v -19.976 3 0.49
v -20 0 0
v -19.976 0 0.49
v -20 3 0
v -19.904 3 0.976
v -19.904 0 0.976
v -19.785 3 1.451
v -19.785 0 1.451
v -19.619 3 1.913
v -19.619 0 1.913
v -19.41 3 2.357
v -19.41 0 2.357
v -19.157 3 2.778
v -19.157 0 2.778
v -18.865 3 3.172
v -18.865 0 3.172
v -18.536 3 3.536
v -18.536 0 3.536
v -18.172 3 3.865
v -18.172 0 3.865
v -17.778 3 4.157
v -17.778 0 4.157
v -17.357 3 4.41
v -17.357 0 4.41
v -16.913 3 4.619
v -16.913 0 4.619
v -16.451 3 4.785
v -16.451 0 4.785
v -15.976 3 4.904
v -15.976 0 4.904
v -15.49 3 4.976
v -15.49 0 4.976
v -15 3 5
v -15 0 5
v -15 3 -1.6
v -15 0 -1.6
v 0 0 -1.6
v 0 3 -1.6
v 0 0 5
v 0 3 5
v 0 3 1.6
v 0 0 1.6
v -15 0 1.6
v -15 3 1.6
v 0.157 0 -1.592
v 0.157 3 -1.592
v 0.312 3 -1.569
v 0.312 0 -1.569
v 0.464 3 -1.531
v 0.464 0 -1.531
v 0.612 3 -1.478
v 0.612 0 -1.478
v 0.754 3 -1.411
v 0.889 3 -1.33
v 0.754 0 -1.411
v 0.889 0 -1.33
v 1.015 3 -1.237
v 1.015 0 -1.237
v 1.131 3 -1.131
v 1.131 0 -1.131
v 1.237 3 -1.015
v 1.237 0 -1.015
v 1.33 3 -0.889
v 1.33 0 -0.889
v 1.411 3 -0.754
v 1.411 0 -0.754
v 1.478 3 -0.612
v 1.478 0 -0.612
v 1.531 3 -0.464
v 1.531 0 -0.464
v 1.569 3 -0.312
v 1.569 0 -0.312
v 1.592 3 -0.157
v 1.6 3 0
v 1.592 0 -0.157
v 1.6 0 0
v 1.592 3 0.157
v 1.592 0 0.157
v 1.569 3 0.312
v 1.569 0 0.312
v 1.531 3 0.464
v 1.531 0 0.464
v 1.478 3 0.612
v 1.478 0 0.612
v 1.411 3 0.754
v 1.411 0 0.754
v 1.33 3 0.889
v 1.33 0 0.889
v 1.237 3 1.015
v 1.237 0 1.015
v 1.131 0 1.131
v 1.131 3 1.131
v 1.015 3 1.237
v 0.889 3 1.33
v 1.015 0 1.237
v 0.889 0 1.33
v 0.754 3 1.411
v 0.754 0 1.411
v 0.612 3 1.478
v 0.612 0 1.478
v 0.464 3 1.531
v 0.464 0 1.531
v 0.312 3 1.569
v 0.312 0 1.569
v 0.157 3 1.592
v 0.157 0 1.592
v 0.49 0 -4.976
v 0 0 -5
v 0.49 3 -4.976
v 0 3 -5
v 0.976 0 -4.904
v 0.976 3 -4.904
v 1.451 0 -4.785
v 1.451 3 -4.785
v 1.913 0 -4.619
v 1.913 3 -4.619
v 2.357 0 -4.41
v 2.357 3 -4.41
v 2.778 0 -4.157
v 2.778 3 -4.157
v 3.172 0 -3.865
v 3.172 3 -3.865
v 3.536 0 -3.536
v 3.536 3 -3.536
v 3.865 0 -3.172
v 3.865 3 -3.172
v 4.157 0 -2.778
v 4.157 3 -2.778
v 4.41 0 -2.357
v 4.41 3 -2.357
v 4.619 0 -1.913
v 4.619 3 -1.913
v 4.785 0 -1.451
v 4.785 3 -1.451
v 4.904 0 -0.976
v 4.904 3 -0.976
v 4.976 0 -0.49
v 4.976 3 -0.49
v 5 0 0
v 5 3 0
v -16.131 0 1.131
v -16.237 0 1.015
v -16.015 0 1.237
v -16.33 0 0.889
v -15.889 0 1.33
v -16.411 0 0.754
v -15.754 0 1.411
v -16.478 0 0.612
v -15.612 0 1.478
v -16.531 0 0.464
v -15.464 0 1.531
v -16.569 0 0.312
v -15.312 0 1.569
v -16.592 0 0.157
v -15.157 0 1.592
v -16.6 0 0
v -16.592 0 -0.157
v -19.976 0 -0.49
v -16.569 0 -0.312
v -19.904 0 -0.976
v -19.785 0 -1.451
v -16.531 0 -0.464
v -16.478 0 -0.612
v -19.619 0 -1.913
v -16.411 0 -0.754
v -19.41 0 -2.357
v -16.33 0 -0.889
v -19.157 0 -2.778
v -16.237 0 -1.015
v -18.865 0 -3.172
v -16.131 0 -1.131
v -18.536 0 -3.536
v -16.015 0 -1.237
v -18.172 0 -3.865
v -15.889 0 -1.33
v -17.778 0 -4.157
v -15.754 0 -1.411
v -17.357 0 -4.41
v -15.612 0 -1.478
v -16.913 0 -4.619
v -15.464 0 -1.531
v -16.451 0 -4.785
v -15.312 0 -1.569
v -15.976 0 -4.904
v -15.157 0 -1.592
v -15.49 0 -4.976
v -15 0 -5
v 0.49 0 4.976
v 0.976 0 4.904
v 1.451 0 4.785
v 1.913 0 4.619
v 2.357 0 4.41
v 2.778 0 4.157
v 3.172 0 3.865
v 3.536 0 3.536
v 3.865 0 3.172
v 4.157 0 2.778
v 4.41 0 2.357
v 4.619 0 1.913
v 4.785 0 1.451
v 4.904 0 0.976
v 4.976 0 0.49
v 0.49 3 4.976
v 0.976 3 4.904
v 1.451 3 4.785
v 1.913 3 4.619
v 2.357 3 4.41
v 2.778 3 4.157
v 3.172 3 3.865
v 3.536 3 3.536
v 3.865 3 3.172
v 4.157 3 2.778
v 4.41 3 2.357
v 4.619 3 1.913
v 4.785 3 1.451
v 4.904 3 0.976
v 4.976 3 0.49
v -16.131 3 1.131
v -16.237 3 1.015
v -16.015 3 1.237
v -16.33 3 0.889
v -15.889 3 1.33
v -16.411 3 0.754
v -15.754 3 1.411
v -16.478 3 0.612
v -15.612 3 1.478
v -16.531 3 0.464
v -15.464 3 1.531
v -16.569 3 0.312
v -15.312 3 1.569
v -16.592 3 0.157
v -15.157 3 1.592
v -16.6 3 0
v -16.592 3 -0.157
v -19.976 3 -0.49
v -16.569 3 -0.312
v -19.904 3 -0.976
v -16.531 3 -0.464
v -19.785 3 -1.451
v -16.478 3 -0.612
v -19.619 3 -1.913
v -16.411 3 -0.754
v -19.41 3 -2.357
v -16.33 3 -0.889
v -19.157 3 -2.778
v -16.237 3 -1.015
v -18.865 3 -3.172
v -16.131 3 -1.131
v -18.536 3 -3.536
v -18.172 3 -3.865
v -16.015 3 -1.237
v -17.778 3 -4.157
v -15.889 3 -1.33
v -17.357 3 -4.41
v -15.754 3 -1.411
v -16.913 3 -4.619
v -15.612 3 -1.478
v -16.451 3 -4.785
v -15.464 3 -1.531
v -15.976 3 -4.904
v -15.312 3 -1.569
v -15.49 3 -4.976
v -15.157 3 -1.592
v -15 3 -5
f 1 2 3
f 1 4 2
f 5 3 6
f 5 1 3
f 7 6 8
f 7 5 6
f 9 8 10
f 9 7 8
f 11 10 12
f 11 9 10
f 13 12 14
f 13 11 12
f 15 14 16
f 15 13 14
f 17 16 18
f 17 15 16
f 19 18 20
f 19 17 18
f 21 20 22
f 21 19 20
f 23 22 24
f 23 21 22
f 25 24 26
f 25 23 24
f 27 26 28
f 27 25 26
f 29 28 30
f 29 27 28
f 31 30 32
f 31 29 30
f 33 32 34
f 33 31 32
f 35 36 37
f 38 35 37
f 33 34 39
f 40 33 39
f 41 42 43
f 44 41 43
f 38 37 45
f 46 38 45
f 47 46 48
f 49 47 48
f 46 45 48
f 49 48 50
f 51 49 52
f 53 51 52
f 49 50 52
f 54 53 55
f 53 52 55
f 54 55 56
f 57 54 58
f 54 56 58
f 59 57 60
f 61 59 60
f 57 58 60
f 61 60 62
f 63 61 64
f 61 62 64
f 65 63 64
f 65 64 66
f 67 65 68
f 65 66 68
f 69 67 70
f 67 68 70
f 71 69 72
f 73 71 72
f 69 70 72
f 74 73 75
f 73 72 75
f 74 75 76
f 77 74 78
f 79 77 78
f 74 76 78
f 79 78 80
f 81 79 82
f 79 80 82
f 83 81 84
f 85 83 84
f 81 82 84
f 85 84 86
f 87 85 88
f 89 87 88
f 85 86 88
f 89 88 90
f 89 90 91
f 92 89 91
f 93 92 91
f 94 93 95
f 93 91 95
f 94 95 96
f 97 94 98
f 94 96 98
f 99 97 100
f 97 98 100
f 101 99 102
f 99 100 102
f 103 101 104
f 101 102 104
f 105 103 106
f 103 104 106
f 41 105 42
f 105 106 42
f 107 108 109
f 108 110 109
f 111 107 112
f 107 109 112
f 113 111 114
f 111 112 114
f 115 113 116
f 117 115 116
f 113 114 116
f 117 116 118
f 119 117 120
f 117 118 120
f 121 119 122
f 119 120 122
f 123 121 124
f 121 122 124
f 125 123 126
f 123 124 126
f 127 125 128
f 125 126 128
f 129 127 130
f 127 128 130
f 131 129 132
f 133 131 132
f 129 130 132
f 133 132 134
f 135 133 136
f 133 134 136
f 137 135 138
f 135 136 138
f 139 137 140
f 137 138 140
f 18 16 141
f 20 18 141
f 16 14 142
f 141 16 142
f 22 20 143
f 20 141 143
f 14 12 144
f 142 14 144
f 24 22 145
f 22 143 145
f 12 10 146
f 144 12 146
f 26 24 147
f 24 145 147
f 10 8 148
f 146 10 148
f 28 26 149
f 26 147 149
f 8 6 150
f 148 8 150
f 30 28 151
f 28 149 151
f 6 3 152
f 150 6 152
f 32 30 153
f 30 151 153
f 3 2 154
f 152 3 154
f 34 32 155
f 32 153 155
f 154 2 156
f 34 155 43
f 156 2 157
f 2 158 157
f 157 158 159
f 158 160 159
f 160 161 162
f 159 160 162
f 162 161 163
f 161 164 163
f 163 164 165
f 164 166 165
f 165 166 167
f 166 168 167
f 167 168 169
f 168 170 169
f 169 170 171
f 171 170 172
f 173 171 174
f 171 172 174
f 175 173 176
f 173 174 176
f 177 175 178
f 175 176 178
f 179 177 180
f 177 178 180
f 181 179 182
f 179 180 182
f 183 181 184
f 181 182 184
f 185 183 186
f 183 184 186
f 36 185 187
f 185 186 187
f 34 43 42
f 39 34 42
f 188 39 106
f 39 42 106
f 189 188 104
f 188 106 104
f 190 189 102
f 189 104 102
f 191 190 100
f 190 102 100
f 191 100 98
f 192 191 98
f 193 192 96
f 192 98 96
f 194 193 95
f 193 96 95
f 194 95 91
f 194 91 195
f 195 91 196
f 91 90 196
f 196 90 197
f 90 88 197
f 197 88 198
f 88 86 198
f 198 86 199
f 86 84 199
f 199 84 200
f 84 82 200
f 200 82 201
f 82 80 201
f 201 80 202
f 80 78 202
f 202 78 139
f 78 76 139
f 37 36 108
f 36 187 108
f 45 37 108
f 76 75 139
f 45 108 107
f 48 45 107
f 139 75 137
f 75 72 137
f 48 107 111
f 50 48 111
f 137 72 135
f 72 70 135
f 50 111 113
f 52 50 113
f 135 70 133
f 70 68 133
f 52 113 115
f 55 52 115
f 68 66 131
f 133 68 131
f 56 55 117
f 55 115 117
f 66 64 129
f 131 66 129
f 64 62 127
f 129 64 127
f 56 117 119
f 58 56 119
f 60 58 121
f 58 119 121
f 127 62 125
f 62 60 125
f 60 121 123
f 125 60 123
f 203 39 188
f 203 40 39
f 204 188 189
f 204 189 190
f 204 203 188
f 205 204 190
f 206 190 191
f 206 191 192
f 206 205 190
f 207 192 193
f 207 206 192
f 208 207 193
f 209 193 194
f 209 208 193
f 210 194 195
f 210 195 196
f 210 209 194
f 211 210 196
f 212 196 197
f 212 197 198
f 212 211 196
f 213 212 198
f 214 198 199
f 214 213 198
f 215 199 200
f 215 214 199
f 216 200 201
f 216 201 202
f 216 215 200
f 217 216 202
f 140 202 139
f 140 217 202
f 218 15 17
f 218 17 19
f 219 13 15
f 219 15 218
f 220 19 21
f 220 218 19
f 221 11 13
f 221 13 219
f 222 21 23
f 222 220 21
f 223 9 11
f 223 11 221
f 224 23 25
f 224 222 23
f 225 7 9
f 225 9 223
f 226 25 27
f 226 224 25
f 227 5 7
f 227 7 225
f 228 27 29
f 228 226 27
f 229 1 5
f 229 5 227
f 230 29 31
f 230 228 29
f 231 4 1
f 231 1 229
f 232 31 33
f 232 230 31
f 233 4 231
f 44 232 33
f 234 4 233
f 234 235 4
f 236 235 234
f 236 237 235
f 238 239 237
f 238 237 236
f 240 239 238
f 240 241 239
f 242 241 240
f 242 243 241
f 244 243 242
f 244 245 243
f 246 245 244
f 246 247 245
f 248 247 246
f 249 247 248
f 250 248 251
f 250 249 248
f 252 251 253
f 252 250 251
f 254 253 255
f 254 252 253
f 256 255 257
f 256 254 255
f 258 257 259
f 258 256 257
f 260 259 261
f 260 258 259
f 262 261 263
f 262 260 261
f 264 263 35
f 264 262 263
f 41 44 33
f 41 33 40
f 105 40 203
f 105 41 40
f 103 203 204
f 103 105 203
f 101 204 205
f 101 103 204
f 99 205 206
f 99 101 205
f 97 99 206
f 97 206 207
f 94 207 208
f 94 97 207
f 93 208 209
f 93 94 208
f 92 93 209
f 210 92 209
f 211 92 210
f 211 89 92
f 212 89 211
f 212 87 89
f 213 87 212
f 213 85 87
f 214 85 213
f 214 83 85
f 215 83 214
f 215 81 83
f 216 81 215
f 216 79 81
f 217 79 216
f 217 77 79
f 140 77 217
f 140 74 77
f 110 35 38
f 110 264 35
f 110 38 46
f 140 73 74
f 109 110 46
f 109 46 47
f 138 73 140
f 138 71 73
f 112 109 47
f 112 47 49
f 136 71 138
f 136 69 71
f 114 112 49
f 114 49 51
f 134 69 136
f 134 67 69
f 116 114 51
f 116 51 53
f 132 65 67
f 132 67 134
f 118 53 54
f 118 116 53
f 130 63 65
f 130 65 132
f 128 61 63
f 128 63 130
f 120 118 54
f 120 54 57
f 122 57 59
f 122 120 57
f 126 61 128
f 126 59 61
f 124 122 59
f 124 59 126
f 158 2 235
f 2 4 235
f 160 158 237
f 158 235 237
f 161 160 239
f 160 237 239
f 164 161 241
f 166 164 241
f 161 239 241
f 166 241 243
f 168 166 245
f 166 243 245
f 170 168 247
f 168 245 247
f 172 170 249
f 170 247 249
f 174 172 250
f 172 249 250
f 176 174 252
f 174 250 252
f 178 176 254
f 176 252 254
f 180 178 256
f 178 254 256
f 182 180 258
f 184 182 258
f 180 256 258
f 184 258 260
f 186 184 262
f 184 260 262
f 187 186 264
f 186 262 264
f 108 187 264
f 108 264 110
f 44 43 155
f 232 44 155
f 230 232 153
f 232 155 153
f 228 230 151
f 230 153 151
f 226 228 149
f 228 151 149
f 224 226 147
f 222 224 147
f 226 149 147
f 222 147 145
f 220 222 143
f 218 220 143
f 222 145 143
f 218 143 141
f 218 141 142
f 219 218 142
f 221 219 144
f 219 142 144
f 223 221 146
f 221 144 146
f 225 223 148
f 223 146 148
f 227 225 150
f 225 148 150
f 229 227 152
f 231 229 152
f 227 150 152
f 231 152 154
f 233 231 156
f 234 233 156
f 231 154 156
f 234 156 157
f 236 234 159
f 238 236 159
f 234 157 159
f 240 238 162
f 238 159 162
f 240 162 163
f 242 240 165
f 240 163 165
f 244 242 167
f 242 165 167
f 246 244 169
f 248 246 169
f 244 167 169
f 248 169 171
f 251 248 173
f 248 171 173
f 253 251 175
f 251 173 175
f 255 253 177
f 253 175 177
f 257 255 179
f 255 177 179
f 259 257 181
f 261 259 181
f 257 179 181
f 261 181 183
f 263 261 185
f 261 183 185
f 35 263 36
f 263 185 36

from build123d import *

# Parameters (mm, degrees)
SKETCH_1_W      = 25
SKETCH_1_H      = 10
EXTRUDE_1_DEPTH = 3
FILLET_1_R      = 5


with BuildPart() as part:
    # 草图1 → 凸台-拉伸1 (new body)
    with BuildSketch(Plane(origin=(0, 0, 0), x_dir=(1, 0, 0), z_dir=(0, 1, 0))):
        with Locations((-7.5, 0)):
            Rectangle(SKETCH_1_W, SKETCH_1_H)
        with BuildLine():
            Line((0, -1.6), (-15, -1.6))
            ThreePointArc((-15, -1.6), (-16.6, 0), (-15, 1.6))
            Line((-15, 1.6), (0, 1.6))
            ThreePointArc((0, 1.6), (1.6, 0), (0, -1.6))
        make_face(mode=Mode.SUBTRACT)
    extrude(amount=EXTRUDE_1_DEPTH)

    # 圆角1
    fillet_1_edges = [part.edges().sort_by_distance(p)[0] for p in [
        (5, 1.5, 5),
        (5, 1.5, -5),
        (-20, 1.5, -5),
        (-20, 1.5, 5),
    ]]
    fillet(fillet_1_edges, radius=FILLET_1_R - 0.0001)  # a hair under: the kernel refuses the full size


solid = part.part
